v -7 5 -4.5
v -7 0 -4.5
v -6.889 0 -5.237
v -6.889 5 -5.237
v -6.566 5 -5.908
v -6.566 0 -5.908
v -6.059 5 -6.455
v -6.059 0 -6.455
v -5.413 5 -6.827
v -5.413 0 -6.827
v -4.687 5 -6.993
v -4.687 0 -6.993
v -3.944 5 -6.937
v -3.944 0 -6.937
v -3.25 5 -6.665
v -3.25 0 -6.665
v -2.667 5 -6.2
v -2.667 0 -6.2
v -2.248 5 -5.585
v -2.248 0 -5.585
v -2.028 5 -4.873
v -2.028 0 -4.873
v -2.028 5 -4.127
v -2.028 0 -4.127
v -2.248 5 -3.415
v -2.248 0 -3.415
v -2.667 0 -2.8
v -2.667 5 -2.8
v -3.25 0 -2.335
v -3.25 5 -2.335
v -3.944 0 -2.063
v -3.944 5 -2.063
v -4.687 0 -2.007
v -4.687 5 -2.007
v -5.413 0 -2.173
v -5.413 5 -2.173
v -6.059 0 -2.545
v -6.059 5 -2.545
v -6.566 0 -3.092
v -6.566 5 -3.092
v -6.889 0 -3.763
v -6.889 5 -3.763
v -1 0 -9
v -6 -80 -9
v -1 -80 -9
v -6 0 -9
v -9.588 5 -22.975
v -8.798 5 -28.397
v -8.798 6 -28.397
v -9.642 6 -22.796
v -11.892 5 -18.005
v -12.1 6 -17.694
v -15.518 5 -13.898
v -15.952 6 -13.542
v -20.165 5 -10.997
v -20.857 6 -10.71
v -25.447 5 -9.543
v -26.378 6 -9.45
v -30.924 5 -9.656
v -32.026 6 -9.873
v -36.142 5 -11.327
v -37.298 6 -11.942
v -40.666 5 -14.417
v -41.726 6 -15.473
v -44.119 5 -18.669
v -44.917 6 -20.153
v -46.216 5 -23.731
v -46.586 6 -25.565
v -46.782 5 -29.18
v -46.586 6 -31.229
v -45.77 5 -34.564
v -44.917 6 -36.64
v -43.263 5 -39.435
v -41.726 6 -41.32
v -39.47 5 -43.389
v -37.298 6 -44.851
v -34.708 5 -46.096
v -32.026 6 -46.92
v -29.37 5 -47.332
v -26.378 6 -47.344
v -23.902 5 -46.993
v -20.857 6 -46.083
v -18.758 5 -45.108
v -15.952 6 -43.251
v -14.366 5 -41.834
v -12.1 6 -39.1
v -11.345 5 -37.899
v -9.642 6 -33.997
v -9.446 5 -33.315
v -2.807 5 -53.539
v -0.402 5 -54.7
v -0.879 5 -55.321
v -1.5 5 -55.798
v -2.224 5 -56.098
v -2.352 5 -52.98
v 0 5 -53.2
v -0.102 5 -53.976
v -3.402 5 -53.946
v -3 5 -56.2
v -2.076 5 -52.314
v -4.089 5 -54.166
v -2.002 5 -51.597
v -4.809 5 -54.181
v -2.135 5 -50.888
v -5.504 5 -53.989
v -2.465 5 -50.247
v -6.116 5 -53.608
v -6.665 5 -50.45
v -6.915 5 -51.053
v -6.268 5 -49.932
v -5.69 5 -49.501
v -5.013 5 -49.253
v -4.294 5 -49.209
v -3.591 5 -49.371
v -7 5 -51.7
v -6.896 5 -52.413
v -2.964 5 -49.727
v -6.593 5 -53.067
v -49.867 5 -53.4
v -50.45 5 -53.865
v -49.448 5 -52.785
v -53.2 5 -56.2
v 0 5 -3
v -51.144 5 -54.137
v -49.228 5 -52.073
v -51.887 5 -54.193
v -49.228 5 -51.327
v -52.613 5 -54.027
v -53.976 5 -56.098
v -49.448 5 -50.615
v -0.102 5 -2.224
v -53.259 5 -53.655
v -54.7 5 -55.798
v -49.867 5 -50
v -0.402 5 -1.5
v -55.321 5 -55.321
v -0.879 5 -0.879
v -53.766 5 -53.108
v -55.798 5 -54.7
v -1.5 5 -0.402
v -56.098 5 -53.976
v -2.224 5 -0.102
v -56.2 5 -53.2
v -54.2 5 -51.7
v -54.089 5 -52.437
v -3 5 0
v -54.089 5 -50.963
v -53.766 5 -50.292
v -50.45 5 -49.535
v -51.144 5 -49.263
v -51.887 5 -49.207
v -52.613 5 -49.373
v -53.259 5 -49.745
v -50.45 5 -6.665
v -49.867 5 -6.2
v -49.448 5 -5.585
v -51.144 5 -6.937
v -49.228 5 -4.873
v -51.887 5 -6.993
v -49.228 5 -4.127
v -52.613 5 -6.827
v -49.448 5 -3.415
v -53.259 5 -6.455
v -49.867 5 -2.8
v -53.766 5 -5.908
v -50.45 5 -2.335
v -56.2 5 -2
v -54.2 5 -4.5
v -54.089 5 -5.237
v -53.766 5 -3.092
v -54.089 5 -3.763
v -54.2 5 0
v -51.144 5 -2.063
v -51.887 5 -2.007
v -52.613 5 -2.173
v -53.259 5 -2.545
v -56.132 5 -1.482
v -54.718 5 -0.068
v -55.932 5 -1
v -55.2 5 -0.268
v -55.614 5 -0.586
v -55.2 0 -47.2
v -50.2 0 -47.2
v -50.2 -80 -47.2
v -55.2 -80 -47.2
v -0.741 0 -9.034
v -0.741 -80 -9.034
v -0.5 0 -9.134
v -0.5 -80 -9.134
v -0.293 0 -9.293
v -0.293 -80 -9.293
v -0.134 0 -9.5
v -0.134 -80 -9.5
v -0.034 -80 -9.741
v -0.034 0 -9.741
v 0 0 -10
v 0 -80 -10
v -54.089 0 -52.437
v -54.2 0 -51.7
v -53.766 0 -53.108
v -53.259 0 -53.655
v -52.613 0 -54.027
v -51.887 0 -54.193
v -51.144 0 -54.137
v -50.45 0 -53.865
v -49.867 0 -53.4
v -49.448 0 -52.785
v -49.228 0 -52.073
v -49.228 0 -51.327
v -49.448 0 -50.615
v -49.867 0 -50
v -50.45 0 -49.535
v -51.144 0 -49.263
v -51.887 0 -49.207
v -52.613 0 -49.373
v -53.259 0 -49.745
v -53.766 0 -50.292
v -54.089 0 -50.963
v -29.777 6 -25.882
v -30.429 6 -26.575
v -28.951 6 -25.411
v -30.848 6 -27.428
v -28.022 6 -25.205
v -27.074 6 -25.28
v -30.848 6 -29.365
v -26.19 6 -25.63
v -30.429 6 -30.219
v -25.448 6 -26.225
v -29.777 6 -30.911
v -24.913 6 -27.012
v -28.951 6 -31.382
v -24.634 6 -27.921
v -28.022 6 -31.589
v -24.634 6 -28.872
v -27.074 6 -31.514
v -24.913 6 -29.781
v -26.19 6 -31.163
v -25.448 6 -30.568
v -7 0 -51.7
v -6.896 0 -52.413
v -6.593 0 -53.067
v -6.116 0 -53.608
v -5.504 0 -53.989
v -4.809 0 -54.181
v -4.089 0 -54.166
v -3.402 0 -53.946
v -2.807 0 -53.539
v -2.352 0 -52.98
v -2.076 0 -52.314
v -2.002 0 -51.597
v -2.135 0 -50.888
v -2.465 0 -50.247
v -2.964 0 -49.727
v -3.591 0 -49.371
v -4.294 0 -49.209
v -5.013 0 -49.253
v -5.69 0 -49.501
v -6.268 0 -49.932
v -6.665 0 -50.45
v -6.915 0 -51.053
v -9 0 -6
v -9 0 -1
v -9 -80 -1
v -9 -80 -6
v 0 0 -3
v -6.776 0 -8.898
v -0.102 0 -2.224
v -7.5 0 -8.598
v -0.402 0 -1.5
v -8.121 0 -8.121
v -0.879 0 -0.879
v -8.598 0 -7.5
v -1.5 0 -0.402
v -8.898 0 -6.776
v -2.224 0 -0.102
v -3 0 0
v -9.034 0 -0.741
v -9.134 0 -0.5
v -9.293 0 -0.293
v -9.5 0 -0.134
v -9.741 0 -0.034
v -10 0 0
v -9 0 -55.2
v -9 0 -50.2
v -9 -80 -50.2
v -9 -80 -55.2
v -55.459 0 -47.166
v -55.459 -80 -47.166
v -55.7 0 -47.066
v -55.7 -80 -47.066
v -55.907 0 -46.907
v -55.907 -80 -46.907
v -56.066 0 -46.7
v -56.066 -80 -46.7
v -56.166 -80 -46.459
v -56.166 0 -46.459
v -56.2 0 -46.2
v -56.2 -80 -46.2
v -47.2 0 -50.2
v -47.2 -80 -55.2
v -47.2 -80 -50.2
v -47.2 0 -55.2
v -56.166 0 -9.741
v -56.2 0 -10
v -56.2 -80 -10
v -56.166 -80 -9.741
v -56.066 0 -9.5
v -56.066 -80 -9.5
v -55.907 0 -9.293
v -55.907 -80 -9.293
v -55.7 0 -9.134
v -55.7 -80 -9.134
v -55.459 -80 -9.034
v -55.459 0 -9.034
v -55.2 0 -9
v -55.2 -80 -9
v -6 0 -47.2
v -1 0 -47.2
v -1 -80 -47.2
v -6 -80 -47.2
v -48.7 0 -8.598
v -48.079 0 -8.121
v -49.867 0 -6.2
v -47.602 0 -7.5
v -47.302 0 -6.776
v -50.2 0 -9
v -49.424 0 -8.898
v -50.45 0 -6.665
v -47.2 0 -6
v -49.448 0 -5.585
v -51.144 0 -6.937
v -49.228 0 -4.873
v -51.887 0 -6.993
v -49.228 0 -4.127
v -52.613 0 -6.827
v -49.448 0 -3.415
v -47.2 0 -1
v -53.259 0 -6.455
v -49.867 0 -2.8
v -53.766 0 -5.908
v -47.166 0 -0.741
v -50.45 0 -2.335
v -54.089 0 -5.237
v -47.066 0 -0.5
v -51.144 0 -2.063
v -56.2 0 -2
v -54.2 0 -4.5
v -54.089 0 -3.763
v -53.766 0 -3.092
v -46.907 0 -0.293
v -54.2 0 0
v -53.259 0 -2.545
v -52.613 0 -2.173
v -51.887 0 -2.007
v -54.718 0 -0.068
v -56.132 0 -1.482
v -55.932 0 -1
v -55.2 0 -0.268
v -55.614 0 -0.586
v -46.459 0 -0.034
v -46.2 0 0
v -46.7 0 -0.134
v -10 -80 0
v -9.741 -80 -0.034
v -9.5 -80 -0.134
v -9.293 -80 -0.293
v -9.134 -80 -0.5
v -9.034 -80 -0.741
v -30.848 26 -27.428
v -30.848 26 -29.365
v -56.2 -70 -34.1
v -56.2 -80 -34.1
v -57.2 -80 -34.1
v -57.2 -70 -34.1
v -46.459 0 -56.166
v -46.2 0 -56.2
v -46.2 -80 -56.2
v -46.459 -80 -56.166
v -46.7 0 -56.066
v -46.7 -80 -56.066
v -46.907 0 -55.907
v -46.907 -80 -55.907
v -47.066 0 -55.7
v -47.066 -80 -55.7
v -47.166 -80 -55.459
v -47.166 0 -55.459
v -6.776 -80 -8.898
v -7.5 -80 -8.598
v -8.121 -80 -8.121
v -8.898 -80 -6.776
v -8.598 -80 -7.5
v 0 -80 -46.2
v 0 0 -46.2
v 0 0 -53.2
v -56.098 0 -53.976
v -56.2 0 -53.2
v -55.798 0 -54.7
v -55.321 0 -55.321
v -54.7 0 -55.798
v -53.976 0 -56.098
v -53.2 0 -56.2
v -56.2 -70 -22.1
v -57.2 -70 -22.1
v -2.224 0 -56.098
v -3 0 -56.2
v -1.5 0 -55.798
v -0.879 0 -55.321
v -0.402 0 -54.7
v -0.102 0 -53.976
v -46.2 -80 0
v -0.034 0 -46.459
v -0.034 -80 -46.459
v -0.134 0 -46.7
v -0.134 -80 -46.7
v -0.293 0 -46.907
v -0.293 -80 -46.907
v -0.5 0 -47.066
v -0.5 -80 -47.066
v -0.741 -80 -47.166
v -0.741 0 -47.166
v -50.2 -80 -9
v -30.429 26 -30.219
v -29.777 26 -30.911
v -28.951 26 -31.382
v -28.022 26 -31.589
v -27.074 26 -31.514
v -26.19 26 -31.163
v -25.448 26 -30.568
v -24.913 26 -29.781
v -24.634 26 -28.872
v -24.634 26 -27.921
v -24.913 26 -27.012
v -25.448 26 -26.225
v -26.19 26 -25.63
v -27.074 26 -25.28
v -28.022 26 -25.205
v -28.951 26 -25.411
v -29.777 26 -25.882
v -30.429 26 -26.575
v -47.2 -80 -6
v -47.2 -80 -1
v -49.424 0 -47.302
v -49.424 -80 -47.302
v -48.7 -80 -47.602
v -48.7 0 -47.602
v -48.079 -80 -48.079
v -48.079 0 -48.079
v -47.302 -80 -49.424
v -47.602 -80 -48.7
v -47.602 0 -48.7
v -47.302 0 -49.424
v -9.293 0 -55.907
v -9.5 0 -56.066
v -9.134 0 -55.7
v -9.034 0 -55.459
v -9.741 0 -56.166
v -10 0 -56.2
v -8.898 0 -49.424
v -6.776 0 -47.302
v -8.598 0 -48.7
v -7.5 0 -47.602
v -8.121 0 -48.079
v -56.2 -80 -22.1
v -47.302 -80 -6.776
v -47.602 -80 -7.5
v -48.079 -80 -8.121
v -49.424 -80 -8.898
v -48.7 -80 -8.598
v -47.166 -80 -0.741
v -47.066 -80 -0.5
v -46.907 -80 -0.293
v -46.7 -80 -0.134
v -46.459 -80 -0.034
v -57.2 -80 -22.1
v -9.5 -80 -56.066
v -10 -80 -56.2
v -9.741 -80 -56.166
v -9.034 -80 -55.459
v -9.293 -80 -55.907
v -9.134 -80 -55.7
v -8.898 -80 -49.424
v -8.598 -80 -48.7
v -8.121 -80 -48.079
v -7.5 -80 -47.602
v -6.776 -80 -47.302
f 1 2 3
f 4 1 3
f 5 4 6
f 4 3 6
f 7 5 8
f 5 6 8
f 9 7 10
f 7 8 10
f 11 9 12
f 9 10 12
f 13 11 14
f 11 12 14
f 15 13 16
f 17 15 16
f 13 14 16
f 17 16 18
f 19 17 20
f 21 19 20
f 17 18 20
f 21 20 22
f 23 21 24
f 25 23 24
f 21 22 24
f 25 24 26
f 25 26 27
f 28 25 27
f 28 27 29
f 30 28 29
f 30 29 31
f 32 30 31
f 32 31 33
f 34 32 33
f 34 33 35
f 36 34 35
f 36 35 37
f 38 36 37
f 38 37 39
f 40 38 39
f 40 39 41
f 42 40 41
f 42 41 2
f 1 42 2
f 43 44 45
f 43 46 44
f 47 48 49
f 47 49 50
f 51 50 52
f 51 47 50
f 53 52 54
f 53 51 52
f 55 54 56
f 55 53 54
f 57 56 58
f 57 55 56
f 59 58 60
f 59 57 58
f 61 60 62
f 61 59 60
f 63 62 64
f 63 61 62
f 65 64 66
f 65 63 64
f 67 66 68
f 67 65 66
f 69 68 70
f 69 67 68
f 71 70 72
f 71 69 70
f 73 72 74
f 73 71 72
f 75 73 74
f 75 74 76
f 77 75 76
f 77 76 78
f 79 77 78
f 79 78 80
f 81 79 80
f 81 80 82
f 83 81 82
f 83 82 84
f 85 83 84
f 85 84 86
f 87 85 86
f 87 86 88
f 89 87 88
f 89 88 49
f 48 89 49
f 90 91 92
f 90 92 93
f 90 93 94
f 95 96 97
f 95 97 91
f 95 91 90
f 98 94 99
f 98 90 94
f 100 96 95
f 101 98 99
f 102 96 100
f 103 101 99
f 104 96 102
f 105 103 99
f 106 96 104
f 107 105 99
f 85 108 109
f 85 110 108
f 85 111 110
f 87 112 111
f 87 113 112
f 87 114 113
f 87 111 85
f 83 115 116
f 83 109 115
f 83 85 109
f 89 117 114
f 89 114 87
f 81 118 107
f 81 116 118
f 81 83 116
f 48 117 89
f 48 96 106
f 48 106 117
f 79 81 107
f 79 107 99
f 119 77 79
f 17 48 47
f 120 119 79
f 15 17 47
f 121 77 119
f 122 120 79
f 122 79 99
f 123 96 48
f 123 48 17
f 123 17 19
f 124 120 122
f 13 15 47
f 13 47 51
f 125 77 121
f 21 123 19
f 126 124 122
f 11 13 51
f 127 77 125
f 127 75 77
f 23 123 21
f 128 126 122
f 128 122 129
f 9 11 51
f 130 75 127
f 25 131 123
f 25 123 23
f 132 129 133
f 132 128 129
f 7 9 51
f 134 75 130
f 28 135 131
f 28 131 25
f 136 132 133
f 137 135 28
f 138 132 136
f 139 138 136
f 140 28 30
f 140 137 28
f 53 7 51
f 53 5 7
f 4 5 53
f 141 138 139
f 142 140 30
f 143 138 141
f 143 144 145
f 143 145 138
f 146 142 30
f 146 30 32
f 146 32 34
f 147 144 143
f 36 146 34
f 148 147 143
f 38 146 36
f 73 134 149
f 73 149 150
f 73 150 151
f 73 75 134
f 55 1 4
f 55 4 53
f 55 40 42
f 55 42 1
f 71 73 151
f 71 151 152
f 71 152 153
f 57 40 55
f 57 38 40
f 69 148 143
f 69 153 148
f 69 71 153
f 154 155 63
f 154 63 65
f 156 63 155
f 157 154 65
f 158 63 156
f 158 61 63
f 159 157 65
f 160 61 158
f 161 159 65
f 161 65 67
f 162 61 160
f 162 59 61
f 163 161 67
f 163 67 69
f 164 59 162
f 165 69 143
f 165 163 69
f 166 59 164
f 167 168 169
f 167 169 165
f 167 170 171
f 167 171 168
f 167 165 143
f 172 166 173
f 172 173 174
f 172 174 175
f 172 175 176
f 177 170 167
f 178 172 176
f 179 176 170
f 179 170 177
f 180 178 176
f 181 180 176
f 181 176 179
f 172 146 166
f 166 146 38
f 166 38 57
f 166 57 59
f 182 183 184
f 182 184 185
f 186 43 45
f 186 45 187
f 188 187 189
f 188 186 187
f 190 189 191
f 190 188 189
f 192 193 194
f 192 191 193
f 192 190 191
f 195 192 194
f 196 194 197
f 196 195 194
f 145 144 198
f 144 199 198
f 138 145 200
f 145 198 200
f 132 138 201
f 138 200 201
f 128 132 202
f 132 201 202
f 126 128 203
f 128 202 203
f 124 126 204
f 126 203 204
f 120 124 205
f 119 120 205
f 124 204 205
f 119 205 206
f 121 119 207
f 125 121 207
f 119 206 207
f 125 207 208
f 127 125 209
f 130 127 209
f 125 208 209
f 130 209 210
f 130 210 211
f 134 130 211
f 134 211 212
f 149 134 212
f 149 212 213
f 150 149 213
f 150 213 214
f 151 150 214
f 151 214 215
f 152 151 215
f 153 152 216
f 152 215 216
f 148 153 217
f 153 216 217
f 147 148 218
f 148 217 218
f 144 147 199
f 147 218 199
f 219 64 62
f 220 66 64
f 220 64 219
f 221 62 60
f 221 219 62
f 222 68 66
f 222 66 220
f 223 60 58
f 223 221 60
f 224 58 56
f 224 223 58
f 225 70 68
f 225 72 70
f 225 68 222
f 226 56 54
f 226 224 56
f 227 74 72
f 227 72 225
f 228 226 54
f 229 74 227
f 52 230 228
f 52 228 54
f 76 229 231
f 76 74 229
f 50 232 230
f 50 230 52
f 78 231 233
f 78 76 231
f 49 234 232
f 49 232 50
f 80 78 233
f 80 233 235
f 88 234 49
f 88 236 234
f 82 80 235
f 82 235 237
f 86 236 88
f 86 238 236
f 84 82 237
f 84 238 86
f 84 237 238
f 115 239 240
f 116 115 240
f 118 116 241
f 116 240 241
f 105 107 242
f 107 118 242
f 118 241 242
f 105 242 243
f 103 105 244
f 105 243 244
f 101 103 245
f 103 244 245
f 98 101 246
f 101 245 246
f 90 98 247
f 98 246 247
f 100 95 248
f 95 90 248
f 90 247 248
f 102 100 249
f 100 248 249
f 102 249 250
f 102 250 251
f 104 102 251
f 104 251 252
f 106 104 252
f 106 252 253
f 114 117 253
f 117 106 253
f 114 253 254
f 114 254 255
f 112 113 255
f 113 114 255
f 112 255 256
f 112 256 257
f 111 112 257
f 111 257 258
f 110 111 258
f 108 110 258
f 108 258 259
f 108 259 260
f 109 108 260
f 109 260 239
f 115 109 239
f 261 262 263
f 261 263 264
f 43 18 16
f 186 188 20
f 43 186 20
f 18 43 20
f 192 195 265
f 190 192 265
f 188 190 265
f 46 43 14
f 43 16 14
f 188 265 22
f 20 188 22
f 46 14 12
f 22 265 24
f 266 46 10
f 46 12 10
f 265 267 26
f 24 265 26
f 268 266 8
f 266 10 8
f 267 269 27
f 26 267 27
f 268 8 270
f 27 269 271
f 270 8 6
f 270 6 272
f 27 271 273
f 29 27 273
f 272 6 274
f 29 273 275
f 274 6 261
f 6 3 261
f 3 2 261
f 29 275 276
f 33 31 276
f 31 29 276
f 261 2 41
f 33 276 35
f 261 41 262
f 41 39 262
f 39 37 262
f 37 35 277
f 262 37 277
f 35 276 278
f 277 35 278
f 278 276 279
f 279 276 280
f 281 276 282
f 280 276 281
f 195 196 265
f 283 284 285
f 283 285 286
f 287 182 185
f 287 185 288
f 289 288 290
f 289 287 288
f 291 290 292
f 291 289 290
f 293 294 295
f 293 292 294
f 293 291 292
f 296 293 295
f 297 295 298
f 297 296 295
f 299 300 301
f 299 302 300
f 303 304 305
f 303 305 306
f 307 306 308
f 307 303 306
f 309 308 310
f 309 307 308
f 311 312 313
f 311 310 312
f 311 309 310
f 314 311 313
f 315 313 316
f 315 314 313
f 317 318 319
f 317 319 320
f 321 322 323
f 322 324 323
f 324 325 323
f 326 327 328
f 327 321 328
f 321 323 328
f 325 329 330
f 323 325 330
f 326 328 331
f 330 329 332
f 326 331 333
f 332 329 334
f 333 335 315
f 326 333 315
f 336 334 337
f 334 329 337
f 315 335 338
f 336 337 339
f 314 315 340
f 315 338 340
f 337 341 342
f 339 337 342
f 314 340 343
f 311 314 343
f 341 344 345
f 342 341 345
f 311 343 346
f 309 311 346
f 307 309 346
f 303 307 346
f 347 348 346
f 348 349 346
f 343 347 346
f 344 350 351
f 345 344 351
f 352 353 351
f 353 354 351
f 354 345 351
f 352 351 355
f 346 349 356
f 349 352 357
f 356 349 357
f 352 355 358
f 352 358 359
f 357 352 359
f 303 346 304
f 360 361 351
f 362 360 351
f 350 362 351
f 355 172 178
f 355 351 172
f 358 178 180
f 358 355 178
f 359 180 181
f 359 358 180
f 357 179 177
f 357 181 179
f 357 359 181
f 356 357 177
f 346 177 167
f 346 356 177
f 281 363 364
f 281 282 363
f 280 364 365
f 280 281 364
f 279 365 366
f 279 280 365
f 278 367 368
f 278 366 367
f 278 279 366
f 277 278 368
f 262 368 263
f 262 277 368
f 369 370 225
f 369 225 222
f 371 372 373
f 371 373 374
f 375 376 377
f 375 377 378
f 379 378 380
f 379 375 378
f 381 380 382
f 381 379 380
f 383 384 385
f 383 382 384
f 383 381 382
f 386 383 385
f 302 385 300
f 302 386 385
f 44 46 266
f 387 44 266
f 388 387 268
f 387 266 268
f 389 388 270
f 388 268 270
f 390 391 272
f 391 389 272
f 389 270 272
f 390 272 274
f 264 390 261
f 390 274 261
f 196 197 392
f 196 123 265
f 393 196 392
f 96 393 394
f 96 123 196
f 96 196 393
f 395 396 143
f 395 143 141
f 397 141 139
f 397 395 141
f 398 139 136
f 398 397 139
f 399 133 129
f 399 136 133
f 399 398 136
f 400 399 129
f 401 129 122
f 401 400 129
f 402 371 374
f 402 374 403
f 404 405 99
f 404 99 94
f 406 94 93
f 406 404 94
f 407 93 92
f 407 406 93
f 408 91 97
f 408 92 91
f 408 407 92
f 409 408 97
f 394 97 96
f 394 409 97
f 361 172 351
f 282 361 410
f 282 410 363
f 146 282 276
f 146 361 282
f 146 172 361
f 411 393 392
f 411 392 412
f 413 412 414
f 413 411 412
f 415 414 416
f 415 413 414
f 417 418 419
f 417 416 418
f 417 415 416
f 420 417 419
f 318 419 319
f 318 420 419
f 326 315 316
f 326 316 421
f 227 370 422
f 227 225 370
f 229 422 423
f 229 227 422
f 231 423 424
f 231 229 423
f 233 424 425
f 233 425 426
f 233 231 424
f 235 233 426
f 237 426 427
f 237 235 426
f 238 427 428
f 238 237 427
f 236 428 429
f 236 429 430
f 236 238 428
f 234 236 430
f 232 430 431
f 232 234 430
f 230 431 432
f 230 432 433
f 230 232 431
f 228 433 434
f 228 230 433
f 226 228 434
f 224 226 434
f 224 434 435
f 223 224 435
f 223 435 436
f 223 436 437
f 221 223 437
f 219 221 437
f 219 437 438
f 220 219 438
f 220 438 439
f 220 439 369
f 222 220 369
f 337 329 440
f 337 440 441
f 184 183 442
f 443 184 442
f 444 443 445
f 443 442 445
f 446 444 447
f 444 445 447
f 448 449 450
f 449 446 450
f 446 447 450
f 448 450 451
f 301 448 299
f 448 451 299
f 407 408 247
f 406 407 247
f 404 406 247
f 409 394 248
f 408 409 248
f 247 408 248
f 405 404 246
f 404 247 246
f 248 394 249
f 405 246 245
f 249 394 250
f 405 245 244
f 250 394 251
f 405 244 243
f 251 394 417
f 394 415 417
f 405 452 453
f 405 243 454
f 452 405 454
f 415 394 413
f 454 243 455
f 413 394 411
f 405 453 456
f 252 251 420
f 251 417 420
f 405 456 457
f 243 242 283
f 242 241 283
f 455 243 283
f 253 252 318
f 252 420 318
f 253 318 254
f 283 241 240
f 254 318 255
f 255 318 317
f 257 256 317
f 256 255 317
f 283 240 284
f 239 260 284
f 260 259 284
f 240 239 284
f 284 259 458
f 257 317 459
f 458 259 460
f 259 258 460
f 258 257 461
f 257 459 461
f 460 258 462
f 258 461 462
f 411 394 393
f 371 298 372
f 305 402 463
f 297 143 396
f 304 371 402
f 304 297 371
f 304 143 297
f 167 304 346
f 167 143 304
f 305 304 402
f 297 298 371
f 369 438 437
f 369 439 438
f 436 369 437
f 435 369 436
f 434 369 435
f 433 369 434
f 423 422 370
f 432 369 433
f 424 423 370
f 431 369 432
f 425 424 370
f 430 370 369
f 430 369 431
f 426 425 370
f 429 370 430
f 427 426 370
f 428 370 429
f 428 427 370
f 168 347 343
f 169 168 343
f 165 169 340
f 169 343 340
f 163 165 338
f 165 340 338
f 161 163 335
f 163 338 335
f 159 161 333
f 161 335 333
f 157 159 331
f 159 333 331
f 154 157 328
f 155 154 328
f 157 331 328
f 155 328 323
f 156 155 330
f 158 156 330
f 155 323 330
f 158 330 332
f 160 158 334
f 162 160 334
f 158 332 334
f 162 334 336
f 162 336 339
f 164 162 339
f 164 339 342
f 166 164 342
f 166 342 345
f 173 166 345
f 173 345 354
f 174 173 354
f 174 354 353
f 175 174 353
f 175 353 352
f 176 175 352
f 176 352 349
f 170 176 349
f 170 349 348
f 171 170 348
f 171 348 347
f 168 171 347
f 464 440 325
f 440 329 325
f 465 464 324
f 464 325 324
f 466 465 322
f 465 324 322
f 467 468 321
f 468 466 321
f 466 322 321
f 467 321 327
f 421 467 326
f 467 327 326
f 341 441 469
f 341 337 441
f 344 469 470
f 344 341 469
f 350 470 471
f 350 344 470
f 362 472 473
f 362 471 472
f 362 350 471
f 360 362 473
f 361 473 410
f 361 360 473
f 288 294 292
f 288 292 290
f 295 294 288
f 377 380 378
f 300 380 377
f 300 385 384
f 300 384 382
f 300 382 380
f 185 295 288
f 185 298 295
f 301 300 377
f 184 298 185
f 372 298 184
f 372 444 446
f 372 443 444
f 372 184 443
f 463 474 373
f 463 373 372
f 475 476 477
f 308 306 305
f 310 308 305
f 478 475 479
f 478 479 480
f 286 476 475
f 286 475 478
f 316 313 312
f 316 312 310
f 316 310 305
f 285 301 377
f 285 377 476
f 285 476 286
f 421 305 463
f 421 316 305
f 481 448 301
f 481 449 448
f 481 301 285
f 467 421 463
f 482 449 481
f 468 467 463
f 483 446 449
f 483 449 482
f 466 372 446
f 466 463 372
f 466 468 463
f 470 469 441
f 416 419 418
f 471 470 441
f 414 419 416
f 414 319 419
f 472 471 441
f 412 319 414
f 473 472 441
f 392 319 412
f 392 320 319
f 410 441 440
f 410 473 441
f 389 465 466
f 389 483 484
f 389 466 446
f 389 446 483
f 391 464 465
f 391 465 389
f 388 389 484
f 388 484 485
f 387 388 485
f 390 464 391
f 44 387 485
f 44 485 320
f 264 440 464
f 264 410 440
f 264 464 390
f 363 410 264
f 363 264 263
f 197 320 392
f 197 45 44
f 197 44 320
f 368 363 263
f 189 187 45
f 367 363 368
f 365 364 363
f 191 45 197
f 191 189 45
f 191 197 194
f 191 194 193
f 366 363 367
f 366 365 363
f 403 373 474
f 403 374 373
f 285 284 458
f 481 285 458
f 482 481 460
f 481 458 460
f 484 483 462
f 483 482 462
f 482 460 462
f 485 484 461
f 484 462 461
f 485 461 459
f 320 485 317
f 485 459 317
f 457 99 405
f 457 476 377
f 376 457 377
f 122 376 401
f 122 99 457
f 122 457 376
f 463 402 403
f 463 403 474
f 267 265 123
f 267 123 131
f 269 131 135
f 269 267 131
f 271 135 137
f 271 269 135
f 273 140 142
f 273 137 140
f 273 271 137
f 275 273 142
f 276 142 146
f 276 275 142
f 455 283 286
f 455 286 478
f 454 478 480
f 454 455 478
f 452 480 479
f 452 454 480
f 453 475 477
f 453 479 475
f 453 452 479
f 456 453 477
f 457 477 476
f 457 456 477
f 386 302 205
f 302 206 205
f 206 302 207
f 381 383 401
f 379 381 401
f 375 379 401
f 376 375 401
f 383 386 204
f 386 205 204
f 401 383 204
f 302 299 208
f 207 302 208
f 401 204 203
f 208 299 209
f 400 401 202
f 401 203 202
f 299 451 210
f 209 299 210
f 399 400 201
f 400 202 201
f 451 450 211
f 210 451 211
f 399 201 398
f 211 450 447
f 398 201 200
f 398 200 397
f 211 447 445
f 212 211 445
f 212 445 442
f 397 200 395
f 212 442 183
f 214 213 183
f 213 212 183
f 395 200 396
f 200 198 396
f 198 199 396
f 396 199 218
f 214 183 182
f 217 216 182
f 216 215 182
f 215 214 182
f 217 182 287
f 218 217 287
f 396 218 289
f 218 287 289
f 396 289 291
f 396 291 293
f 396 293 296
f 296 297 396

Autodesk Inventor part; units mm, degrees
ref_plane "YZ Plane" through (0, 0, 0) normal (1, 0, 0) x (0, 1, 0)
ref_plane "XZ Plane" through (0, 0, 0) normal (0, 1, 0) x (-1, 0, 0)
ref_plane "XY Plane" through (0, 0, 0) normal (0, 0, 1) x (1, 0, 0)
sketch "Sketch1" plane through (0, 0, 0) normal (0, 1, 0) x (-1, 0, 0)
  line L0 (3, 0) -> (54.2, 0)
  line L1 (56.2, -2) -> (56.2, -53.2)
  line L2 (53.2, -56.2) -> (3, -56.2)
  line L3 (0, -53.2) -> (0, -3)
  line L4 (56.2, 0) -> (51.7, 0)
  line L5 (51.7, 0) -> (51.7, -4.5)
  line L6 (51.7, -4.5) -> (56.2, -4.5)
  line L7 (56.2, -4.5) -> (56.2, 0)
  circle A0 centre (51.7, -4.5) radius 2.5
  line L8 (56.2, -56.2) -> (51.7, -56.2)
  line L9 (51.7, -56.2) -> (51.7, -51.7)
  line L10 (51.7, -51.7) -> (56.2, -51.7)
  line L11 (56.2, -51.7) -> (56.2, -56.2)
  circle A1 centre (51.7, -51.7) radius 2.5
  line L12 (0, 0) -> (4.5, 0)
  line L13 (4.5, 0) -> (4.5, -4.5)
  line L14 (4.5, -4.5) -> (0, -4.5)
  line L15 (0, -4.5) -> (0, 0)
  circle A2 centre (4.5, -4.5) radius 2.5
  circle A3 centre (4.5, -51.7) radius 2.5
  arc A4 (56.2, -2) -> (54.2, 0) centre (54.2, -2) ccw
  arc A5 (53.2, -56.2) -> (56.2, -53.2) centre (53.2, -53.2) ccw
  arc A6 (0, -53.2) -> (3, -56.2) centre (3, -53.2) ccw
  arc A7 (3, 0) -> (0, -3) centre (3, -3) ccw
  line L16 (51.7, -4.5) -> (4.5, -51.7)
  line L17 (4.5, -4.5) -> (51.7, -51.7)
  circle A8 centre (28.1, -28.1) radius 19
  point P0 (0, -56.2)
  dimension "d0" = 56.2
  dimension "d1" = 56.2
  dimension "d2" = 4.5
  dimension "d3" = 4.5
  dimension "d4" = 5
  dimension "d5" = 4.5
  dimension "d6" = 4.5
  dimension "d7" = 2
  dimension "d8" = 3
  dimension "d9" = 38
  dimension "d34" = 4.5
  dimension "d35" = 4.5
extrude "Extrusion1" add sketch "Sketch1" along normal blind 5 contours L0 L13 A2 L14 L3 A7 | L0 L5 A0 L16 A8 L17 A2 L13 | L0 A4 L1 L6 A0 L5 | L14 A2 L17 A8 A1 L9 L2 A6 L3 | L6 L1 L10 A1 L17 A8 L16 A0 | A8 L17 L16 | L16 L17 A8 | L17 L16 A8 | L9 A1 L10 L1 A5 L2 | L17 A8 L16
sketch "Sketch2" plane through (0, 5, 0) normal (0, 1, 0) x (1, 0, 0)
  circle A0 centre (-51.7, 4.5) radius 2.5 projected
  circle A1 centre (-4.5, 4.5) radius 2.5 projected
  circle A2 centre (-4.5, 51.7) radius 2.5 projected
  circle A3 centre (-51.7, 51.7) radius 2.5 projected
  circle A4 centre (-51.7, 4.5) radius 2.5 projected
  line L0 (-4.5, 51.7) -> (-4.5, 4.5)
  circle A5 centre (-27.7983, 28.3967) radius 19
  line L1 (-4.5, 4.5) -> (-14.6658, 14.6658)
  line L2 (-41.5292, 41.5292) -> (-51.7, 51.7)
  line L3 (-51.7, 4.5) -> (-28.25, 27.95)
  line L4 (-14.3658, 41.8342) -> (-4.5, 51.7)
  point P0 (0, 0)
  dimension "d12" = 38
extrude "Extrusion2" add sketch "Sketch2" along normal blind 1 contours A5
sketch "Sketch3" plane through (-27.7983, 6, -28.3967) normal (0, 1, 0) x (1, 0, 0)
  circle A0 centre (0, 0) radius 3.2
  circle A1 centre (0, 0) radius 3.05
  line L0 (-3.05, 0) -> (-3.05, 0.9682)
  line L1 (-3.05, 0) -> (-3.05, -0.9682)
  point P0 (27.7983, -28.3967)
  dimension "d16" = 6.1
  dimension "d15" = 6.4
extrude "Extrusion3" add sketch "Sketch3" along normal blind 20 contours A1 | A0 L1 L0 picked at (-2.904, -1.0385)
sketch "Sketch4" plane through (0, 0, 0) normal (0, -1, 0) x (1, 0, 0)
  line L0 (-3, -56.2) -> (-53.2, -56.2) projected
  line L1 (-56.2, -53.2) -> (-56.2, -2) projected
  line L2 (-54.2, 0) -> (-3, 0) projected
  line L3 (0, -3) -> (0, -53.2) projected
  arc A0 (-56.2, -53.2) -> (-53.2, -56.2) centre (-53.2, -53.2) ccw projected
  line L4 (-56.2, -2) -> (-56.2, 0)
  arc A1 (-54.2, 0) -> (-56.2, -2) centre (-54.2, -2) ccw projected
  line L5 (-56.2, 0) -> (-54.2, 0)
  line L6 (-3, 0) -> (0, 0)
  arc A2 (0, -3) -> (-3, 0) centre (-3, -3) ccw projected
  line L7 (0, 0) -> (0, -3)
  arc A3 (-3, -56.2) -> (0, -53.2) centre (-3, -53.2) ccw projected
  line L8 (-3, -56.2) -> (0, -56.2)
  line L9 (0, -56.2) -> (0, -53.2)
  circle A4 centre (-51.7, -51.7) radius 2.5 projected
  line L10 (-53.2, -56.2) -> (-47.2, -56.2)
  line L11 (-47.2, -55.2) -> (-47.2, -50.2)
  line L12 (-50.2, -47.2) -> (-55.2, -47.2)
  line L13 (-56.2, -47.2) -> (-56.2, -53.2)
  line L14 (-56.2, -56.2) -> (-47.2, -47.2) construction
  line L15 (-47.2, -56.2) -> (-56.2, -47.2) construction
  arc A5 (-47.2, -50.2) -> (-50.2, -47.2) centre (-50.2, -50.2) ccw
  arc A6 (-56.2, -53.2) -> (-53.2, -56.2) centre (-53.2, -53.2) ccw
  circle A7 centre (-51.7, -4.5) radius 2.5 projected
  circle A8 centre (-4.5, -4.5) radius 2.5 projected
  circle A9 centre (-4.5, -51.7) radius 2.5 projected
  line L16 (-55.2, -9) -> (-50.2, -9)
  line L17 (-47.2, -6) -> (-47.2, -1)
  line L18 (-47.2, 0) -> (-56.2, 0)
  line L19 (-56.2, 0) -> (-56.2, -9)
  circle A10 centre (-51.7, -4.5) radius 2.5 projected
  line L20 (-56.2, -9) -> (-47.2, 0) construction
  line L21 (-47.2, -9) -> (-56.2, 0) construction
  line L22 (-6, -9) -> (-1, -9)
  line L23 (0, -9) -> (0, 0)
  line L24 (0, 0) -> (-9, 0)
  line L25 (-9, -1) -> (-9, -6)
  line L26 (-9, -9) -> (0, 0) construction
  line L27 (0, -9) -> (-9, 0) construction
  line L28 (-9, -56.2) -> (0, -56.2)
  line L29 (0, -56.2) -> (0, -47.2)
  line L30 (-1, -47.2) -> (-6, -47.2)
  line L31 (-9, -50.2) -> (-9, -55.2)
  line L32 (-9, -56.2) -> (0, -47.2) construction
  line L33 (0, -56.2) -> (-9, -47.2) construction
  arc A11 (-50.2, -9) -> (-47.2, -6) centre (-50.2, -6) ccw
  arc A12 (-9, -6) -> (-6, -9) centre (-6, -6) ccw
  arc A13 (-6, -47.2) -> (-9, -50.2) centre (-6, -50.2) ccw
  line L34 (-46.2, -56.2) -> (-10, -56.2)
  line L35 (-3, -56.2) -> (-53.2, -56.2) projected
  line L36 (-56.2, -46.2) -> (-56.2, -10)
  line L37 (-54.2, 0) -> (-3, 0) projected
  line L38 (-46.2, 0) -> (-10, 0)
  line L39 (0, -10) -> (0, -46.2)
  arc A14 (-56.2, -46.2) -> (-55.2, -47.2) centre (-55.2, -46.2) ccw
  arc A15 (-47.2, -55.2) -> (-46.2, -56.2) centre (-46.2, -55.2) ccw
  arc A16 (-55.2, -9) -> (-56.2, -10) centre (-55.2, -10) ccw
  arc A17 (-46.2, 0) -> (-47.2, -1) centre (-46.2, -1) ccw
  arc A18 (-9, -1) -> (-10, 0) centre (-10, -1) ccw
  arc A19 (0, -10) -> (-1, -9) centre (-1, -10) ccw
  arc A20 (-1, -47.2) -> (0, -46.2) centre (-1, -46.2) ccw
  arc A21 (-10, -56.2) -> (-9, -55.2) centre (-10, -55.2) ccw
  point P0 (-56.2, -47.2)
  point P1 (-46.9, -55.9)
  point P2 (-9, -55.9)
  point P3 (-46.9, 0)
  point P4 (-55.9, -9)
  point P5 (-55.9, -46.9)
  point P6 (0, -46.2)
  point P7 (-56.2, -10)
  point P8 (-46.2, 0)
  point P9 (-56.2, -46.2)
  dimension "d19" = 9
  dimension "d20" = 9
  dimension "d21" = 3
  dimension "d22" = 9
  dimension "d23" = 9
  dimension "d24" = 3
  dimension "d27" = 1
extrude "Extrusion4" add sketch "Sketch4" along normal blind 80 contours L0 A15 L11 A5 L12 A14 L1 A16 L16 A11 L17 A17 L2 A18 L25 A12 L22 A19 L3 A20 L30 A13 L31 A21
sketch "Sketch5" plane through (-56.2, 0, -2) normal (-1, 0, 0) x (0, 0, 1)
  line L0 (-44.2, 0) -> (-44.2, -80) projected
  line L1 (-44.2, -80) -> (-26.1, -80)
  line L2 (-8, -80) -> (-44.2, -80) projected
  line L3 (-26.1, -80) -> (-26.1, -75)
  line L4 (-20.1, -80) -> (-32.1, -80)
  line L5 (-32.1, -80) -> (-32.1, -70)
  line L6 (-32.1, -70) -> (-20.1, -70)
  line L7 (-20.1, -70) -> (-20.1, -80)
  line L8 (-20.1, -80) -> (-32.1, -70) construction
  line L9 (-32.1, -80) -> (-20.1, -70) construction
  point P0 (2, 0)
  dimension "d28" = 18.1
  dimension "d29" = 5
  dimension "d30" = 12
  dimension "d31" = 10
extrude "Extrusion5" add sketch "Sketch5" along normal blind 1
sketch "Sketch6" plane through (0, 5, 0) normal (0, 1, 0) x (1, 0, 0)
  circle A0 centre (-27.7983, 28.3967) radius 19 projected
  arc A1 (-53.2, 56.2) -> (-56.2, 53.2) centre (-53.2, 53.2) ccw projected
  line L0 (-56.2, 53.2) -> (-56.2, 2) projected
  arc A2 (-56.2, 2) -> (-54.2, 0) centre (-54.2, 2) ccw projected
  line L1 (-54.2, 0) -> (-3, 0) projected
  arc A3 (-3, 0) -> (0, 3) centre (-3, 3) ccw projected
  line L2 (0, 3) -> (0, 53.2) projected
  arc A4 (0, 53.2) -> (-3, 56.2) centre (-3, 53.2) ccw projected
  line L3 (-3, 56.2) -> (-53.2, 56.2) projected
  circle A5 centre (-4.5, 51.7) radius 2.5 projected
  circle A6 centre (-51.7, 51.7) radius 2.5 projected
  circle A7 centre (-4.5, 4.5) radius 2.5 projected
  circle A8 centre (-51.7, 4.5) radius 2.5 projected
  point P0 (0, 0)
sketch "Sketch7" plane through (-54.2, 5, 0) normal (0, 0, 1) x (1, 0, 0)
  line L0 (44.2, -85) -> (8, -85) projected
  line L1 (26.1, -85) -> (26.1, -82)
  circle A0 centre (26.1, -82) radius 3
  point P0 (54.2, -5)
  dimension "d36" = 3
sketch "Sketch8" plane through (0, 0, -53.2) normal (1, 0, 0) x (0, 0, -1)
  line L0 (-7, -80) -> (-43.2, -80) projected
  line L1 (-25.1, -80) -> (-25.1, -77)
  circle A0 centre (-25.1, -77) radius 3
  point P0 (-53.2, 0)
  dimension "d37" = 3
equation "\"BendRadius\" = Thickness"
equation "\"BendReliefWidth\" = Thickness"
equation "\"BendReliefDepth\" = 0.5 * Thickness"
equation "\"CornerReliefSize\" = 4 * Thickness"
equation "\"MinimumRemnant\" = 2 * Thickness"
equation "\"TransitionRadius\" = BendRadius"
equation "\"JacobiRadiusSize\" = BendRadius"
equation "\"GapSize\" = Thickness"
equation "\"Thickness\" = 0.5"
properties part number "motor"
